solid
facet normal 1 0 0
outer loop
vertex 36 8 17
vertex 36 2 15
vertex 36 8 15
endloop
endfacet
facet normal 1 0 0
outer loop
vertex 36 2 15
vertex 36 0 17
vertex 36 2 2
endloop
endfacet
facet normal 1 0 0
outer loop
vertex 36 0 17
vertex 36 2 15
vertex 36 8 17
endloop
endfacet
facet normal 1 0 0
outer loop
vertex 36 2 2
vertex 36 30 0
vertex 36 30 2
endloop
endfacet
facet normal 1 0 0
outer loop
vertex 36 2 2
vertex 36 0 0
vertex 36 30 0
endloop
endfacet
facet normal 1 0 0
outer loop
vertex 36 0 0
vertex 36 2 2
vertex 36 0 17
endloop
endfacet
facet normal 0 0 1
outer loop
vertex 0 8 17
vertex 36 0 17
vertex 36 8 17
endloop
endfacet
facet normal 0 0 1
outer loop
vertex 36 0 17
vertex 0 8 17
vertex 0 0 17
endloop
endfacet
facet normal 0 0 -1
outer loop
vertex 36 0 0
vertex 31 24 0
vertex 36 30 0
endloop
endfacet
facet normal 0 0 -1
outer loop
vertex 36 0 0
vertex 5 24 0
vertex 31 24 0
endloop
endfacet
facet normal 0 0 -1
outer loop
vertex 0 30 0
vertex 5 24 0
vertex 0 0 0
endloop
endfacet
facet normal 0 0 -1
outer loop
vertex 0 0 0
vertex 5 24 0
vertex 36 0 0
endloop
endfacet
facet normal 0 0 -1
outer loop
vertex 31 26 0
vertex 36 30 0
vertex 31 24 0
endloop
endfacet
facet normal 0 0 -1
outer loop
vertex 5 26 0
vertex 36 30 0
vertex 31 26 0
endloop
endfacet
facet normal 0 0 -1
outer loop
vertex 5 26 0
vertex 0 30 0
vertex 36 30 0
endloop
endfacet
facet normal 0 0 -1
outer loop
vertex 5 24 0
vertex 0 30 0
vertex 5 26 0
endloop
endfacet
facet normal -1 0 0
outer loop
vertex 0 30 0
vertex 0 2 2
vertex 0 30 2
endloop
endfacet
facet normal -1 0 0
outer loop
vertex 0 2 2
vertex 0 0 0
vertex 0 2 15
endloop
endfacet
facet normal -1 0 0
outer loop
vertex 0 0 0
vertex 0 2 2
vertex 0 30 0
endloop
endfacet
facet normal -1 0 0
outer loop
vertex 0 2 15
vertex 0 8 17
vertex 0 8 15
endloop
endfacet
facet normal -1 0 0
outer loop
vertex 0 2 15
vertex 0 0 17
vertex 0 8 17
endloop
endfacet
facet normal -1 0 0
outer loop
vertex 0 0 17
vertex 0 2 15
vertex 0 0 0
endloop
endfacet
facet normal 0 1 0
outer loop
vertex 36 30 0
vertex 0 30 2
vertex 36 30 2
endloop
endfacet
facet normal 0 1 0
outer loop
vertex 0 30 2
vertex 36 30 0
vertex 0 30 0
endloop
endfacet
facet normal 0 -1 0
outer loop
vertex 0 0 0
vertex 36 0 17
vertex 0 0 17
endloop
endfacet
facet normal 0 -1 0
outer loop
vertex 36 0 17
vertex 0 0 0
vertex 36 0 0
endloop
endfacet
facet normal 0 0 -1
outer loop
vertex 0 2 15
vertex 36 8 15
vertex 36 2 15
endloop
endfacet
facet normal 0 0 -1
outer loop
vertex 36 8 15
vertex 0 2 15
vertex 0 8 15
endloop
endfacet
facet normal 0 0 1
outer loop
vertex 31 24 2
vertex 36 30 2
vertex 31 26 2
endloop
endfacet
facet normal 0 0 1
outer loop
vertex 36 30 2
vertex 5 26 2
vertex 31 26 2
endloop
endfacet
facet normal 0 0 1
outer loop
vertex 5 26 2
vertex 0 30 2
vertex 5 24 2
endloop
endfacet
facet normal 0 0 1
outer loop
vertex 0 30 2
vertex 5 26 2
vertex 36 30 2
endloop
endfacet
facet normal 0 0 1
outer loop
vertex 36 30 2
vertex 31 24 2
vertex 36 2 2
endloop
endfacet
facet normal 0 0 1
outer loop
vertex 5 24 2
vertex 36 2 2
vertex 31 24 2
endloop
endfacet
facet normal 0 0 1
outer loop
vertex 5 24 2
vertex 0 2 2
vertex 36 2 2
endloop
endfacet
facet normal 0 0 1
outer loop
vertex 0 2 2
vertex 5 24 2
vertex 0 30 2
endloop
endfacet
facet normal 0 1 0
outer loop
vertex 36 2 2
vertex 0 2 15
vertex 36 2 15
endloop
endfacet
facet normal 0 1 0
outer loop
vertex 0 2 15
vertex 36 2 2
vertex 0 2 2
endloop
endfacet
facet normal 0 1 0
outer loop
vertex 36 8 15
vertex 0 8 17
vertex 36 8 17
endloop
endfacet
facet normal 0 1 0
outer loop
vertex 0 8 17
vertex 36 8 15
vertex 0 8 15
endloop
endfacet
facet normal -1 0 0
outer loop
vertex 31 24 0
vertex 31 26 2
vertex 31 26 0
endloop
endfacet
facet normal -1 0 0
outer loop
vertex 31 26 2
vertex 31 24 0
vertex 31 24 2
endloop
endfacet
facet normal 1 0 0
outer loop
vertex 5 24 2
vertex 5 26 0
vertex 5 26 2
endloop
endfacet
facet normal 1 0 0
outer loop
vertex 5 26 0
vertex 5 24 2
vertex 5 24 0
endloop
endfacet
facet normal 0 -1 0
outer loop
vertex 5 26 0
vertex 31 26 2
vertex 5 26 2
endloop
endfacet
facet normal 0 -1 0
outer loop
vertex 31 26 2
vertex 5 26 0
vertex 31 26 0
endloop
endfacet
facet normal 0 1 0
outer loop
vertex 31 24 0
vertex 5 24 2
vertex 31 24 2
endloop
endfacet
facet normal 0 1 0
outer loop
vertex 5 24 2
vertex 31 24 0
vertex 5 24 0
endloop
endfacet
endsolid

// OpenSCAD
difference ()
{
	cube([36,30,17]);
	translate([-2,2,2]) cube([40,35,13]);
	translate([-2,8,2]) cube([40,35,20]);
	translate([5,24,-1]) cube([26,2,10]);
}
